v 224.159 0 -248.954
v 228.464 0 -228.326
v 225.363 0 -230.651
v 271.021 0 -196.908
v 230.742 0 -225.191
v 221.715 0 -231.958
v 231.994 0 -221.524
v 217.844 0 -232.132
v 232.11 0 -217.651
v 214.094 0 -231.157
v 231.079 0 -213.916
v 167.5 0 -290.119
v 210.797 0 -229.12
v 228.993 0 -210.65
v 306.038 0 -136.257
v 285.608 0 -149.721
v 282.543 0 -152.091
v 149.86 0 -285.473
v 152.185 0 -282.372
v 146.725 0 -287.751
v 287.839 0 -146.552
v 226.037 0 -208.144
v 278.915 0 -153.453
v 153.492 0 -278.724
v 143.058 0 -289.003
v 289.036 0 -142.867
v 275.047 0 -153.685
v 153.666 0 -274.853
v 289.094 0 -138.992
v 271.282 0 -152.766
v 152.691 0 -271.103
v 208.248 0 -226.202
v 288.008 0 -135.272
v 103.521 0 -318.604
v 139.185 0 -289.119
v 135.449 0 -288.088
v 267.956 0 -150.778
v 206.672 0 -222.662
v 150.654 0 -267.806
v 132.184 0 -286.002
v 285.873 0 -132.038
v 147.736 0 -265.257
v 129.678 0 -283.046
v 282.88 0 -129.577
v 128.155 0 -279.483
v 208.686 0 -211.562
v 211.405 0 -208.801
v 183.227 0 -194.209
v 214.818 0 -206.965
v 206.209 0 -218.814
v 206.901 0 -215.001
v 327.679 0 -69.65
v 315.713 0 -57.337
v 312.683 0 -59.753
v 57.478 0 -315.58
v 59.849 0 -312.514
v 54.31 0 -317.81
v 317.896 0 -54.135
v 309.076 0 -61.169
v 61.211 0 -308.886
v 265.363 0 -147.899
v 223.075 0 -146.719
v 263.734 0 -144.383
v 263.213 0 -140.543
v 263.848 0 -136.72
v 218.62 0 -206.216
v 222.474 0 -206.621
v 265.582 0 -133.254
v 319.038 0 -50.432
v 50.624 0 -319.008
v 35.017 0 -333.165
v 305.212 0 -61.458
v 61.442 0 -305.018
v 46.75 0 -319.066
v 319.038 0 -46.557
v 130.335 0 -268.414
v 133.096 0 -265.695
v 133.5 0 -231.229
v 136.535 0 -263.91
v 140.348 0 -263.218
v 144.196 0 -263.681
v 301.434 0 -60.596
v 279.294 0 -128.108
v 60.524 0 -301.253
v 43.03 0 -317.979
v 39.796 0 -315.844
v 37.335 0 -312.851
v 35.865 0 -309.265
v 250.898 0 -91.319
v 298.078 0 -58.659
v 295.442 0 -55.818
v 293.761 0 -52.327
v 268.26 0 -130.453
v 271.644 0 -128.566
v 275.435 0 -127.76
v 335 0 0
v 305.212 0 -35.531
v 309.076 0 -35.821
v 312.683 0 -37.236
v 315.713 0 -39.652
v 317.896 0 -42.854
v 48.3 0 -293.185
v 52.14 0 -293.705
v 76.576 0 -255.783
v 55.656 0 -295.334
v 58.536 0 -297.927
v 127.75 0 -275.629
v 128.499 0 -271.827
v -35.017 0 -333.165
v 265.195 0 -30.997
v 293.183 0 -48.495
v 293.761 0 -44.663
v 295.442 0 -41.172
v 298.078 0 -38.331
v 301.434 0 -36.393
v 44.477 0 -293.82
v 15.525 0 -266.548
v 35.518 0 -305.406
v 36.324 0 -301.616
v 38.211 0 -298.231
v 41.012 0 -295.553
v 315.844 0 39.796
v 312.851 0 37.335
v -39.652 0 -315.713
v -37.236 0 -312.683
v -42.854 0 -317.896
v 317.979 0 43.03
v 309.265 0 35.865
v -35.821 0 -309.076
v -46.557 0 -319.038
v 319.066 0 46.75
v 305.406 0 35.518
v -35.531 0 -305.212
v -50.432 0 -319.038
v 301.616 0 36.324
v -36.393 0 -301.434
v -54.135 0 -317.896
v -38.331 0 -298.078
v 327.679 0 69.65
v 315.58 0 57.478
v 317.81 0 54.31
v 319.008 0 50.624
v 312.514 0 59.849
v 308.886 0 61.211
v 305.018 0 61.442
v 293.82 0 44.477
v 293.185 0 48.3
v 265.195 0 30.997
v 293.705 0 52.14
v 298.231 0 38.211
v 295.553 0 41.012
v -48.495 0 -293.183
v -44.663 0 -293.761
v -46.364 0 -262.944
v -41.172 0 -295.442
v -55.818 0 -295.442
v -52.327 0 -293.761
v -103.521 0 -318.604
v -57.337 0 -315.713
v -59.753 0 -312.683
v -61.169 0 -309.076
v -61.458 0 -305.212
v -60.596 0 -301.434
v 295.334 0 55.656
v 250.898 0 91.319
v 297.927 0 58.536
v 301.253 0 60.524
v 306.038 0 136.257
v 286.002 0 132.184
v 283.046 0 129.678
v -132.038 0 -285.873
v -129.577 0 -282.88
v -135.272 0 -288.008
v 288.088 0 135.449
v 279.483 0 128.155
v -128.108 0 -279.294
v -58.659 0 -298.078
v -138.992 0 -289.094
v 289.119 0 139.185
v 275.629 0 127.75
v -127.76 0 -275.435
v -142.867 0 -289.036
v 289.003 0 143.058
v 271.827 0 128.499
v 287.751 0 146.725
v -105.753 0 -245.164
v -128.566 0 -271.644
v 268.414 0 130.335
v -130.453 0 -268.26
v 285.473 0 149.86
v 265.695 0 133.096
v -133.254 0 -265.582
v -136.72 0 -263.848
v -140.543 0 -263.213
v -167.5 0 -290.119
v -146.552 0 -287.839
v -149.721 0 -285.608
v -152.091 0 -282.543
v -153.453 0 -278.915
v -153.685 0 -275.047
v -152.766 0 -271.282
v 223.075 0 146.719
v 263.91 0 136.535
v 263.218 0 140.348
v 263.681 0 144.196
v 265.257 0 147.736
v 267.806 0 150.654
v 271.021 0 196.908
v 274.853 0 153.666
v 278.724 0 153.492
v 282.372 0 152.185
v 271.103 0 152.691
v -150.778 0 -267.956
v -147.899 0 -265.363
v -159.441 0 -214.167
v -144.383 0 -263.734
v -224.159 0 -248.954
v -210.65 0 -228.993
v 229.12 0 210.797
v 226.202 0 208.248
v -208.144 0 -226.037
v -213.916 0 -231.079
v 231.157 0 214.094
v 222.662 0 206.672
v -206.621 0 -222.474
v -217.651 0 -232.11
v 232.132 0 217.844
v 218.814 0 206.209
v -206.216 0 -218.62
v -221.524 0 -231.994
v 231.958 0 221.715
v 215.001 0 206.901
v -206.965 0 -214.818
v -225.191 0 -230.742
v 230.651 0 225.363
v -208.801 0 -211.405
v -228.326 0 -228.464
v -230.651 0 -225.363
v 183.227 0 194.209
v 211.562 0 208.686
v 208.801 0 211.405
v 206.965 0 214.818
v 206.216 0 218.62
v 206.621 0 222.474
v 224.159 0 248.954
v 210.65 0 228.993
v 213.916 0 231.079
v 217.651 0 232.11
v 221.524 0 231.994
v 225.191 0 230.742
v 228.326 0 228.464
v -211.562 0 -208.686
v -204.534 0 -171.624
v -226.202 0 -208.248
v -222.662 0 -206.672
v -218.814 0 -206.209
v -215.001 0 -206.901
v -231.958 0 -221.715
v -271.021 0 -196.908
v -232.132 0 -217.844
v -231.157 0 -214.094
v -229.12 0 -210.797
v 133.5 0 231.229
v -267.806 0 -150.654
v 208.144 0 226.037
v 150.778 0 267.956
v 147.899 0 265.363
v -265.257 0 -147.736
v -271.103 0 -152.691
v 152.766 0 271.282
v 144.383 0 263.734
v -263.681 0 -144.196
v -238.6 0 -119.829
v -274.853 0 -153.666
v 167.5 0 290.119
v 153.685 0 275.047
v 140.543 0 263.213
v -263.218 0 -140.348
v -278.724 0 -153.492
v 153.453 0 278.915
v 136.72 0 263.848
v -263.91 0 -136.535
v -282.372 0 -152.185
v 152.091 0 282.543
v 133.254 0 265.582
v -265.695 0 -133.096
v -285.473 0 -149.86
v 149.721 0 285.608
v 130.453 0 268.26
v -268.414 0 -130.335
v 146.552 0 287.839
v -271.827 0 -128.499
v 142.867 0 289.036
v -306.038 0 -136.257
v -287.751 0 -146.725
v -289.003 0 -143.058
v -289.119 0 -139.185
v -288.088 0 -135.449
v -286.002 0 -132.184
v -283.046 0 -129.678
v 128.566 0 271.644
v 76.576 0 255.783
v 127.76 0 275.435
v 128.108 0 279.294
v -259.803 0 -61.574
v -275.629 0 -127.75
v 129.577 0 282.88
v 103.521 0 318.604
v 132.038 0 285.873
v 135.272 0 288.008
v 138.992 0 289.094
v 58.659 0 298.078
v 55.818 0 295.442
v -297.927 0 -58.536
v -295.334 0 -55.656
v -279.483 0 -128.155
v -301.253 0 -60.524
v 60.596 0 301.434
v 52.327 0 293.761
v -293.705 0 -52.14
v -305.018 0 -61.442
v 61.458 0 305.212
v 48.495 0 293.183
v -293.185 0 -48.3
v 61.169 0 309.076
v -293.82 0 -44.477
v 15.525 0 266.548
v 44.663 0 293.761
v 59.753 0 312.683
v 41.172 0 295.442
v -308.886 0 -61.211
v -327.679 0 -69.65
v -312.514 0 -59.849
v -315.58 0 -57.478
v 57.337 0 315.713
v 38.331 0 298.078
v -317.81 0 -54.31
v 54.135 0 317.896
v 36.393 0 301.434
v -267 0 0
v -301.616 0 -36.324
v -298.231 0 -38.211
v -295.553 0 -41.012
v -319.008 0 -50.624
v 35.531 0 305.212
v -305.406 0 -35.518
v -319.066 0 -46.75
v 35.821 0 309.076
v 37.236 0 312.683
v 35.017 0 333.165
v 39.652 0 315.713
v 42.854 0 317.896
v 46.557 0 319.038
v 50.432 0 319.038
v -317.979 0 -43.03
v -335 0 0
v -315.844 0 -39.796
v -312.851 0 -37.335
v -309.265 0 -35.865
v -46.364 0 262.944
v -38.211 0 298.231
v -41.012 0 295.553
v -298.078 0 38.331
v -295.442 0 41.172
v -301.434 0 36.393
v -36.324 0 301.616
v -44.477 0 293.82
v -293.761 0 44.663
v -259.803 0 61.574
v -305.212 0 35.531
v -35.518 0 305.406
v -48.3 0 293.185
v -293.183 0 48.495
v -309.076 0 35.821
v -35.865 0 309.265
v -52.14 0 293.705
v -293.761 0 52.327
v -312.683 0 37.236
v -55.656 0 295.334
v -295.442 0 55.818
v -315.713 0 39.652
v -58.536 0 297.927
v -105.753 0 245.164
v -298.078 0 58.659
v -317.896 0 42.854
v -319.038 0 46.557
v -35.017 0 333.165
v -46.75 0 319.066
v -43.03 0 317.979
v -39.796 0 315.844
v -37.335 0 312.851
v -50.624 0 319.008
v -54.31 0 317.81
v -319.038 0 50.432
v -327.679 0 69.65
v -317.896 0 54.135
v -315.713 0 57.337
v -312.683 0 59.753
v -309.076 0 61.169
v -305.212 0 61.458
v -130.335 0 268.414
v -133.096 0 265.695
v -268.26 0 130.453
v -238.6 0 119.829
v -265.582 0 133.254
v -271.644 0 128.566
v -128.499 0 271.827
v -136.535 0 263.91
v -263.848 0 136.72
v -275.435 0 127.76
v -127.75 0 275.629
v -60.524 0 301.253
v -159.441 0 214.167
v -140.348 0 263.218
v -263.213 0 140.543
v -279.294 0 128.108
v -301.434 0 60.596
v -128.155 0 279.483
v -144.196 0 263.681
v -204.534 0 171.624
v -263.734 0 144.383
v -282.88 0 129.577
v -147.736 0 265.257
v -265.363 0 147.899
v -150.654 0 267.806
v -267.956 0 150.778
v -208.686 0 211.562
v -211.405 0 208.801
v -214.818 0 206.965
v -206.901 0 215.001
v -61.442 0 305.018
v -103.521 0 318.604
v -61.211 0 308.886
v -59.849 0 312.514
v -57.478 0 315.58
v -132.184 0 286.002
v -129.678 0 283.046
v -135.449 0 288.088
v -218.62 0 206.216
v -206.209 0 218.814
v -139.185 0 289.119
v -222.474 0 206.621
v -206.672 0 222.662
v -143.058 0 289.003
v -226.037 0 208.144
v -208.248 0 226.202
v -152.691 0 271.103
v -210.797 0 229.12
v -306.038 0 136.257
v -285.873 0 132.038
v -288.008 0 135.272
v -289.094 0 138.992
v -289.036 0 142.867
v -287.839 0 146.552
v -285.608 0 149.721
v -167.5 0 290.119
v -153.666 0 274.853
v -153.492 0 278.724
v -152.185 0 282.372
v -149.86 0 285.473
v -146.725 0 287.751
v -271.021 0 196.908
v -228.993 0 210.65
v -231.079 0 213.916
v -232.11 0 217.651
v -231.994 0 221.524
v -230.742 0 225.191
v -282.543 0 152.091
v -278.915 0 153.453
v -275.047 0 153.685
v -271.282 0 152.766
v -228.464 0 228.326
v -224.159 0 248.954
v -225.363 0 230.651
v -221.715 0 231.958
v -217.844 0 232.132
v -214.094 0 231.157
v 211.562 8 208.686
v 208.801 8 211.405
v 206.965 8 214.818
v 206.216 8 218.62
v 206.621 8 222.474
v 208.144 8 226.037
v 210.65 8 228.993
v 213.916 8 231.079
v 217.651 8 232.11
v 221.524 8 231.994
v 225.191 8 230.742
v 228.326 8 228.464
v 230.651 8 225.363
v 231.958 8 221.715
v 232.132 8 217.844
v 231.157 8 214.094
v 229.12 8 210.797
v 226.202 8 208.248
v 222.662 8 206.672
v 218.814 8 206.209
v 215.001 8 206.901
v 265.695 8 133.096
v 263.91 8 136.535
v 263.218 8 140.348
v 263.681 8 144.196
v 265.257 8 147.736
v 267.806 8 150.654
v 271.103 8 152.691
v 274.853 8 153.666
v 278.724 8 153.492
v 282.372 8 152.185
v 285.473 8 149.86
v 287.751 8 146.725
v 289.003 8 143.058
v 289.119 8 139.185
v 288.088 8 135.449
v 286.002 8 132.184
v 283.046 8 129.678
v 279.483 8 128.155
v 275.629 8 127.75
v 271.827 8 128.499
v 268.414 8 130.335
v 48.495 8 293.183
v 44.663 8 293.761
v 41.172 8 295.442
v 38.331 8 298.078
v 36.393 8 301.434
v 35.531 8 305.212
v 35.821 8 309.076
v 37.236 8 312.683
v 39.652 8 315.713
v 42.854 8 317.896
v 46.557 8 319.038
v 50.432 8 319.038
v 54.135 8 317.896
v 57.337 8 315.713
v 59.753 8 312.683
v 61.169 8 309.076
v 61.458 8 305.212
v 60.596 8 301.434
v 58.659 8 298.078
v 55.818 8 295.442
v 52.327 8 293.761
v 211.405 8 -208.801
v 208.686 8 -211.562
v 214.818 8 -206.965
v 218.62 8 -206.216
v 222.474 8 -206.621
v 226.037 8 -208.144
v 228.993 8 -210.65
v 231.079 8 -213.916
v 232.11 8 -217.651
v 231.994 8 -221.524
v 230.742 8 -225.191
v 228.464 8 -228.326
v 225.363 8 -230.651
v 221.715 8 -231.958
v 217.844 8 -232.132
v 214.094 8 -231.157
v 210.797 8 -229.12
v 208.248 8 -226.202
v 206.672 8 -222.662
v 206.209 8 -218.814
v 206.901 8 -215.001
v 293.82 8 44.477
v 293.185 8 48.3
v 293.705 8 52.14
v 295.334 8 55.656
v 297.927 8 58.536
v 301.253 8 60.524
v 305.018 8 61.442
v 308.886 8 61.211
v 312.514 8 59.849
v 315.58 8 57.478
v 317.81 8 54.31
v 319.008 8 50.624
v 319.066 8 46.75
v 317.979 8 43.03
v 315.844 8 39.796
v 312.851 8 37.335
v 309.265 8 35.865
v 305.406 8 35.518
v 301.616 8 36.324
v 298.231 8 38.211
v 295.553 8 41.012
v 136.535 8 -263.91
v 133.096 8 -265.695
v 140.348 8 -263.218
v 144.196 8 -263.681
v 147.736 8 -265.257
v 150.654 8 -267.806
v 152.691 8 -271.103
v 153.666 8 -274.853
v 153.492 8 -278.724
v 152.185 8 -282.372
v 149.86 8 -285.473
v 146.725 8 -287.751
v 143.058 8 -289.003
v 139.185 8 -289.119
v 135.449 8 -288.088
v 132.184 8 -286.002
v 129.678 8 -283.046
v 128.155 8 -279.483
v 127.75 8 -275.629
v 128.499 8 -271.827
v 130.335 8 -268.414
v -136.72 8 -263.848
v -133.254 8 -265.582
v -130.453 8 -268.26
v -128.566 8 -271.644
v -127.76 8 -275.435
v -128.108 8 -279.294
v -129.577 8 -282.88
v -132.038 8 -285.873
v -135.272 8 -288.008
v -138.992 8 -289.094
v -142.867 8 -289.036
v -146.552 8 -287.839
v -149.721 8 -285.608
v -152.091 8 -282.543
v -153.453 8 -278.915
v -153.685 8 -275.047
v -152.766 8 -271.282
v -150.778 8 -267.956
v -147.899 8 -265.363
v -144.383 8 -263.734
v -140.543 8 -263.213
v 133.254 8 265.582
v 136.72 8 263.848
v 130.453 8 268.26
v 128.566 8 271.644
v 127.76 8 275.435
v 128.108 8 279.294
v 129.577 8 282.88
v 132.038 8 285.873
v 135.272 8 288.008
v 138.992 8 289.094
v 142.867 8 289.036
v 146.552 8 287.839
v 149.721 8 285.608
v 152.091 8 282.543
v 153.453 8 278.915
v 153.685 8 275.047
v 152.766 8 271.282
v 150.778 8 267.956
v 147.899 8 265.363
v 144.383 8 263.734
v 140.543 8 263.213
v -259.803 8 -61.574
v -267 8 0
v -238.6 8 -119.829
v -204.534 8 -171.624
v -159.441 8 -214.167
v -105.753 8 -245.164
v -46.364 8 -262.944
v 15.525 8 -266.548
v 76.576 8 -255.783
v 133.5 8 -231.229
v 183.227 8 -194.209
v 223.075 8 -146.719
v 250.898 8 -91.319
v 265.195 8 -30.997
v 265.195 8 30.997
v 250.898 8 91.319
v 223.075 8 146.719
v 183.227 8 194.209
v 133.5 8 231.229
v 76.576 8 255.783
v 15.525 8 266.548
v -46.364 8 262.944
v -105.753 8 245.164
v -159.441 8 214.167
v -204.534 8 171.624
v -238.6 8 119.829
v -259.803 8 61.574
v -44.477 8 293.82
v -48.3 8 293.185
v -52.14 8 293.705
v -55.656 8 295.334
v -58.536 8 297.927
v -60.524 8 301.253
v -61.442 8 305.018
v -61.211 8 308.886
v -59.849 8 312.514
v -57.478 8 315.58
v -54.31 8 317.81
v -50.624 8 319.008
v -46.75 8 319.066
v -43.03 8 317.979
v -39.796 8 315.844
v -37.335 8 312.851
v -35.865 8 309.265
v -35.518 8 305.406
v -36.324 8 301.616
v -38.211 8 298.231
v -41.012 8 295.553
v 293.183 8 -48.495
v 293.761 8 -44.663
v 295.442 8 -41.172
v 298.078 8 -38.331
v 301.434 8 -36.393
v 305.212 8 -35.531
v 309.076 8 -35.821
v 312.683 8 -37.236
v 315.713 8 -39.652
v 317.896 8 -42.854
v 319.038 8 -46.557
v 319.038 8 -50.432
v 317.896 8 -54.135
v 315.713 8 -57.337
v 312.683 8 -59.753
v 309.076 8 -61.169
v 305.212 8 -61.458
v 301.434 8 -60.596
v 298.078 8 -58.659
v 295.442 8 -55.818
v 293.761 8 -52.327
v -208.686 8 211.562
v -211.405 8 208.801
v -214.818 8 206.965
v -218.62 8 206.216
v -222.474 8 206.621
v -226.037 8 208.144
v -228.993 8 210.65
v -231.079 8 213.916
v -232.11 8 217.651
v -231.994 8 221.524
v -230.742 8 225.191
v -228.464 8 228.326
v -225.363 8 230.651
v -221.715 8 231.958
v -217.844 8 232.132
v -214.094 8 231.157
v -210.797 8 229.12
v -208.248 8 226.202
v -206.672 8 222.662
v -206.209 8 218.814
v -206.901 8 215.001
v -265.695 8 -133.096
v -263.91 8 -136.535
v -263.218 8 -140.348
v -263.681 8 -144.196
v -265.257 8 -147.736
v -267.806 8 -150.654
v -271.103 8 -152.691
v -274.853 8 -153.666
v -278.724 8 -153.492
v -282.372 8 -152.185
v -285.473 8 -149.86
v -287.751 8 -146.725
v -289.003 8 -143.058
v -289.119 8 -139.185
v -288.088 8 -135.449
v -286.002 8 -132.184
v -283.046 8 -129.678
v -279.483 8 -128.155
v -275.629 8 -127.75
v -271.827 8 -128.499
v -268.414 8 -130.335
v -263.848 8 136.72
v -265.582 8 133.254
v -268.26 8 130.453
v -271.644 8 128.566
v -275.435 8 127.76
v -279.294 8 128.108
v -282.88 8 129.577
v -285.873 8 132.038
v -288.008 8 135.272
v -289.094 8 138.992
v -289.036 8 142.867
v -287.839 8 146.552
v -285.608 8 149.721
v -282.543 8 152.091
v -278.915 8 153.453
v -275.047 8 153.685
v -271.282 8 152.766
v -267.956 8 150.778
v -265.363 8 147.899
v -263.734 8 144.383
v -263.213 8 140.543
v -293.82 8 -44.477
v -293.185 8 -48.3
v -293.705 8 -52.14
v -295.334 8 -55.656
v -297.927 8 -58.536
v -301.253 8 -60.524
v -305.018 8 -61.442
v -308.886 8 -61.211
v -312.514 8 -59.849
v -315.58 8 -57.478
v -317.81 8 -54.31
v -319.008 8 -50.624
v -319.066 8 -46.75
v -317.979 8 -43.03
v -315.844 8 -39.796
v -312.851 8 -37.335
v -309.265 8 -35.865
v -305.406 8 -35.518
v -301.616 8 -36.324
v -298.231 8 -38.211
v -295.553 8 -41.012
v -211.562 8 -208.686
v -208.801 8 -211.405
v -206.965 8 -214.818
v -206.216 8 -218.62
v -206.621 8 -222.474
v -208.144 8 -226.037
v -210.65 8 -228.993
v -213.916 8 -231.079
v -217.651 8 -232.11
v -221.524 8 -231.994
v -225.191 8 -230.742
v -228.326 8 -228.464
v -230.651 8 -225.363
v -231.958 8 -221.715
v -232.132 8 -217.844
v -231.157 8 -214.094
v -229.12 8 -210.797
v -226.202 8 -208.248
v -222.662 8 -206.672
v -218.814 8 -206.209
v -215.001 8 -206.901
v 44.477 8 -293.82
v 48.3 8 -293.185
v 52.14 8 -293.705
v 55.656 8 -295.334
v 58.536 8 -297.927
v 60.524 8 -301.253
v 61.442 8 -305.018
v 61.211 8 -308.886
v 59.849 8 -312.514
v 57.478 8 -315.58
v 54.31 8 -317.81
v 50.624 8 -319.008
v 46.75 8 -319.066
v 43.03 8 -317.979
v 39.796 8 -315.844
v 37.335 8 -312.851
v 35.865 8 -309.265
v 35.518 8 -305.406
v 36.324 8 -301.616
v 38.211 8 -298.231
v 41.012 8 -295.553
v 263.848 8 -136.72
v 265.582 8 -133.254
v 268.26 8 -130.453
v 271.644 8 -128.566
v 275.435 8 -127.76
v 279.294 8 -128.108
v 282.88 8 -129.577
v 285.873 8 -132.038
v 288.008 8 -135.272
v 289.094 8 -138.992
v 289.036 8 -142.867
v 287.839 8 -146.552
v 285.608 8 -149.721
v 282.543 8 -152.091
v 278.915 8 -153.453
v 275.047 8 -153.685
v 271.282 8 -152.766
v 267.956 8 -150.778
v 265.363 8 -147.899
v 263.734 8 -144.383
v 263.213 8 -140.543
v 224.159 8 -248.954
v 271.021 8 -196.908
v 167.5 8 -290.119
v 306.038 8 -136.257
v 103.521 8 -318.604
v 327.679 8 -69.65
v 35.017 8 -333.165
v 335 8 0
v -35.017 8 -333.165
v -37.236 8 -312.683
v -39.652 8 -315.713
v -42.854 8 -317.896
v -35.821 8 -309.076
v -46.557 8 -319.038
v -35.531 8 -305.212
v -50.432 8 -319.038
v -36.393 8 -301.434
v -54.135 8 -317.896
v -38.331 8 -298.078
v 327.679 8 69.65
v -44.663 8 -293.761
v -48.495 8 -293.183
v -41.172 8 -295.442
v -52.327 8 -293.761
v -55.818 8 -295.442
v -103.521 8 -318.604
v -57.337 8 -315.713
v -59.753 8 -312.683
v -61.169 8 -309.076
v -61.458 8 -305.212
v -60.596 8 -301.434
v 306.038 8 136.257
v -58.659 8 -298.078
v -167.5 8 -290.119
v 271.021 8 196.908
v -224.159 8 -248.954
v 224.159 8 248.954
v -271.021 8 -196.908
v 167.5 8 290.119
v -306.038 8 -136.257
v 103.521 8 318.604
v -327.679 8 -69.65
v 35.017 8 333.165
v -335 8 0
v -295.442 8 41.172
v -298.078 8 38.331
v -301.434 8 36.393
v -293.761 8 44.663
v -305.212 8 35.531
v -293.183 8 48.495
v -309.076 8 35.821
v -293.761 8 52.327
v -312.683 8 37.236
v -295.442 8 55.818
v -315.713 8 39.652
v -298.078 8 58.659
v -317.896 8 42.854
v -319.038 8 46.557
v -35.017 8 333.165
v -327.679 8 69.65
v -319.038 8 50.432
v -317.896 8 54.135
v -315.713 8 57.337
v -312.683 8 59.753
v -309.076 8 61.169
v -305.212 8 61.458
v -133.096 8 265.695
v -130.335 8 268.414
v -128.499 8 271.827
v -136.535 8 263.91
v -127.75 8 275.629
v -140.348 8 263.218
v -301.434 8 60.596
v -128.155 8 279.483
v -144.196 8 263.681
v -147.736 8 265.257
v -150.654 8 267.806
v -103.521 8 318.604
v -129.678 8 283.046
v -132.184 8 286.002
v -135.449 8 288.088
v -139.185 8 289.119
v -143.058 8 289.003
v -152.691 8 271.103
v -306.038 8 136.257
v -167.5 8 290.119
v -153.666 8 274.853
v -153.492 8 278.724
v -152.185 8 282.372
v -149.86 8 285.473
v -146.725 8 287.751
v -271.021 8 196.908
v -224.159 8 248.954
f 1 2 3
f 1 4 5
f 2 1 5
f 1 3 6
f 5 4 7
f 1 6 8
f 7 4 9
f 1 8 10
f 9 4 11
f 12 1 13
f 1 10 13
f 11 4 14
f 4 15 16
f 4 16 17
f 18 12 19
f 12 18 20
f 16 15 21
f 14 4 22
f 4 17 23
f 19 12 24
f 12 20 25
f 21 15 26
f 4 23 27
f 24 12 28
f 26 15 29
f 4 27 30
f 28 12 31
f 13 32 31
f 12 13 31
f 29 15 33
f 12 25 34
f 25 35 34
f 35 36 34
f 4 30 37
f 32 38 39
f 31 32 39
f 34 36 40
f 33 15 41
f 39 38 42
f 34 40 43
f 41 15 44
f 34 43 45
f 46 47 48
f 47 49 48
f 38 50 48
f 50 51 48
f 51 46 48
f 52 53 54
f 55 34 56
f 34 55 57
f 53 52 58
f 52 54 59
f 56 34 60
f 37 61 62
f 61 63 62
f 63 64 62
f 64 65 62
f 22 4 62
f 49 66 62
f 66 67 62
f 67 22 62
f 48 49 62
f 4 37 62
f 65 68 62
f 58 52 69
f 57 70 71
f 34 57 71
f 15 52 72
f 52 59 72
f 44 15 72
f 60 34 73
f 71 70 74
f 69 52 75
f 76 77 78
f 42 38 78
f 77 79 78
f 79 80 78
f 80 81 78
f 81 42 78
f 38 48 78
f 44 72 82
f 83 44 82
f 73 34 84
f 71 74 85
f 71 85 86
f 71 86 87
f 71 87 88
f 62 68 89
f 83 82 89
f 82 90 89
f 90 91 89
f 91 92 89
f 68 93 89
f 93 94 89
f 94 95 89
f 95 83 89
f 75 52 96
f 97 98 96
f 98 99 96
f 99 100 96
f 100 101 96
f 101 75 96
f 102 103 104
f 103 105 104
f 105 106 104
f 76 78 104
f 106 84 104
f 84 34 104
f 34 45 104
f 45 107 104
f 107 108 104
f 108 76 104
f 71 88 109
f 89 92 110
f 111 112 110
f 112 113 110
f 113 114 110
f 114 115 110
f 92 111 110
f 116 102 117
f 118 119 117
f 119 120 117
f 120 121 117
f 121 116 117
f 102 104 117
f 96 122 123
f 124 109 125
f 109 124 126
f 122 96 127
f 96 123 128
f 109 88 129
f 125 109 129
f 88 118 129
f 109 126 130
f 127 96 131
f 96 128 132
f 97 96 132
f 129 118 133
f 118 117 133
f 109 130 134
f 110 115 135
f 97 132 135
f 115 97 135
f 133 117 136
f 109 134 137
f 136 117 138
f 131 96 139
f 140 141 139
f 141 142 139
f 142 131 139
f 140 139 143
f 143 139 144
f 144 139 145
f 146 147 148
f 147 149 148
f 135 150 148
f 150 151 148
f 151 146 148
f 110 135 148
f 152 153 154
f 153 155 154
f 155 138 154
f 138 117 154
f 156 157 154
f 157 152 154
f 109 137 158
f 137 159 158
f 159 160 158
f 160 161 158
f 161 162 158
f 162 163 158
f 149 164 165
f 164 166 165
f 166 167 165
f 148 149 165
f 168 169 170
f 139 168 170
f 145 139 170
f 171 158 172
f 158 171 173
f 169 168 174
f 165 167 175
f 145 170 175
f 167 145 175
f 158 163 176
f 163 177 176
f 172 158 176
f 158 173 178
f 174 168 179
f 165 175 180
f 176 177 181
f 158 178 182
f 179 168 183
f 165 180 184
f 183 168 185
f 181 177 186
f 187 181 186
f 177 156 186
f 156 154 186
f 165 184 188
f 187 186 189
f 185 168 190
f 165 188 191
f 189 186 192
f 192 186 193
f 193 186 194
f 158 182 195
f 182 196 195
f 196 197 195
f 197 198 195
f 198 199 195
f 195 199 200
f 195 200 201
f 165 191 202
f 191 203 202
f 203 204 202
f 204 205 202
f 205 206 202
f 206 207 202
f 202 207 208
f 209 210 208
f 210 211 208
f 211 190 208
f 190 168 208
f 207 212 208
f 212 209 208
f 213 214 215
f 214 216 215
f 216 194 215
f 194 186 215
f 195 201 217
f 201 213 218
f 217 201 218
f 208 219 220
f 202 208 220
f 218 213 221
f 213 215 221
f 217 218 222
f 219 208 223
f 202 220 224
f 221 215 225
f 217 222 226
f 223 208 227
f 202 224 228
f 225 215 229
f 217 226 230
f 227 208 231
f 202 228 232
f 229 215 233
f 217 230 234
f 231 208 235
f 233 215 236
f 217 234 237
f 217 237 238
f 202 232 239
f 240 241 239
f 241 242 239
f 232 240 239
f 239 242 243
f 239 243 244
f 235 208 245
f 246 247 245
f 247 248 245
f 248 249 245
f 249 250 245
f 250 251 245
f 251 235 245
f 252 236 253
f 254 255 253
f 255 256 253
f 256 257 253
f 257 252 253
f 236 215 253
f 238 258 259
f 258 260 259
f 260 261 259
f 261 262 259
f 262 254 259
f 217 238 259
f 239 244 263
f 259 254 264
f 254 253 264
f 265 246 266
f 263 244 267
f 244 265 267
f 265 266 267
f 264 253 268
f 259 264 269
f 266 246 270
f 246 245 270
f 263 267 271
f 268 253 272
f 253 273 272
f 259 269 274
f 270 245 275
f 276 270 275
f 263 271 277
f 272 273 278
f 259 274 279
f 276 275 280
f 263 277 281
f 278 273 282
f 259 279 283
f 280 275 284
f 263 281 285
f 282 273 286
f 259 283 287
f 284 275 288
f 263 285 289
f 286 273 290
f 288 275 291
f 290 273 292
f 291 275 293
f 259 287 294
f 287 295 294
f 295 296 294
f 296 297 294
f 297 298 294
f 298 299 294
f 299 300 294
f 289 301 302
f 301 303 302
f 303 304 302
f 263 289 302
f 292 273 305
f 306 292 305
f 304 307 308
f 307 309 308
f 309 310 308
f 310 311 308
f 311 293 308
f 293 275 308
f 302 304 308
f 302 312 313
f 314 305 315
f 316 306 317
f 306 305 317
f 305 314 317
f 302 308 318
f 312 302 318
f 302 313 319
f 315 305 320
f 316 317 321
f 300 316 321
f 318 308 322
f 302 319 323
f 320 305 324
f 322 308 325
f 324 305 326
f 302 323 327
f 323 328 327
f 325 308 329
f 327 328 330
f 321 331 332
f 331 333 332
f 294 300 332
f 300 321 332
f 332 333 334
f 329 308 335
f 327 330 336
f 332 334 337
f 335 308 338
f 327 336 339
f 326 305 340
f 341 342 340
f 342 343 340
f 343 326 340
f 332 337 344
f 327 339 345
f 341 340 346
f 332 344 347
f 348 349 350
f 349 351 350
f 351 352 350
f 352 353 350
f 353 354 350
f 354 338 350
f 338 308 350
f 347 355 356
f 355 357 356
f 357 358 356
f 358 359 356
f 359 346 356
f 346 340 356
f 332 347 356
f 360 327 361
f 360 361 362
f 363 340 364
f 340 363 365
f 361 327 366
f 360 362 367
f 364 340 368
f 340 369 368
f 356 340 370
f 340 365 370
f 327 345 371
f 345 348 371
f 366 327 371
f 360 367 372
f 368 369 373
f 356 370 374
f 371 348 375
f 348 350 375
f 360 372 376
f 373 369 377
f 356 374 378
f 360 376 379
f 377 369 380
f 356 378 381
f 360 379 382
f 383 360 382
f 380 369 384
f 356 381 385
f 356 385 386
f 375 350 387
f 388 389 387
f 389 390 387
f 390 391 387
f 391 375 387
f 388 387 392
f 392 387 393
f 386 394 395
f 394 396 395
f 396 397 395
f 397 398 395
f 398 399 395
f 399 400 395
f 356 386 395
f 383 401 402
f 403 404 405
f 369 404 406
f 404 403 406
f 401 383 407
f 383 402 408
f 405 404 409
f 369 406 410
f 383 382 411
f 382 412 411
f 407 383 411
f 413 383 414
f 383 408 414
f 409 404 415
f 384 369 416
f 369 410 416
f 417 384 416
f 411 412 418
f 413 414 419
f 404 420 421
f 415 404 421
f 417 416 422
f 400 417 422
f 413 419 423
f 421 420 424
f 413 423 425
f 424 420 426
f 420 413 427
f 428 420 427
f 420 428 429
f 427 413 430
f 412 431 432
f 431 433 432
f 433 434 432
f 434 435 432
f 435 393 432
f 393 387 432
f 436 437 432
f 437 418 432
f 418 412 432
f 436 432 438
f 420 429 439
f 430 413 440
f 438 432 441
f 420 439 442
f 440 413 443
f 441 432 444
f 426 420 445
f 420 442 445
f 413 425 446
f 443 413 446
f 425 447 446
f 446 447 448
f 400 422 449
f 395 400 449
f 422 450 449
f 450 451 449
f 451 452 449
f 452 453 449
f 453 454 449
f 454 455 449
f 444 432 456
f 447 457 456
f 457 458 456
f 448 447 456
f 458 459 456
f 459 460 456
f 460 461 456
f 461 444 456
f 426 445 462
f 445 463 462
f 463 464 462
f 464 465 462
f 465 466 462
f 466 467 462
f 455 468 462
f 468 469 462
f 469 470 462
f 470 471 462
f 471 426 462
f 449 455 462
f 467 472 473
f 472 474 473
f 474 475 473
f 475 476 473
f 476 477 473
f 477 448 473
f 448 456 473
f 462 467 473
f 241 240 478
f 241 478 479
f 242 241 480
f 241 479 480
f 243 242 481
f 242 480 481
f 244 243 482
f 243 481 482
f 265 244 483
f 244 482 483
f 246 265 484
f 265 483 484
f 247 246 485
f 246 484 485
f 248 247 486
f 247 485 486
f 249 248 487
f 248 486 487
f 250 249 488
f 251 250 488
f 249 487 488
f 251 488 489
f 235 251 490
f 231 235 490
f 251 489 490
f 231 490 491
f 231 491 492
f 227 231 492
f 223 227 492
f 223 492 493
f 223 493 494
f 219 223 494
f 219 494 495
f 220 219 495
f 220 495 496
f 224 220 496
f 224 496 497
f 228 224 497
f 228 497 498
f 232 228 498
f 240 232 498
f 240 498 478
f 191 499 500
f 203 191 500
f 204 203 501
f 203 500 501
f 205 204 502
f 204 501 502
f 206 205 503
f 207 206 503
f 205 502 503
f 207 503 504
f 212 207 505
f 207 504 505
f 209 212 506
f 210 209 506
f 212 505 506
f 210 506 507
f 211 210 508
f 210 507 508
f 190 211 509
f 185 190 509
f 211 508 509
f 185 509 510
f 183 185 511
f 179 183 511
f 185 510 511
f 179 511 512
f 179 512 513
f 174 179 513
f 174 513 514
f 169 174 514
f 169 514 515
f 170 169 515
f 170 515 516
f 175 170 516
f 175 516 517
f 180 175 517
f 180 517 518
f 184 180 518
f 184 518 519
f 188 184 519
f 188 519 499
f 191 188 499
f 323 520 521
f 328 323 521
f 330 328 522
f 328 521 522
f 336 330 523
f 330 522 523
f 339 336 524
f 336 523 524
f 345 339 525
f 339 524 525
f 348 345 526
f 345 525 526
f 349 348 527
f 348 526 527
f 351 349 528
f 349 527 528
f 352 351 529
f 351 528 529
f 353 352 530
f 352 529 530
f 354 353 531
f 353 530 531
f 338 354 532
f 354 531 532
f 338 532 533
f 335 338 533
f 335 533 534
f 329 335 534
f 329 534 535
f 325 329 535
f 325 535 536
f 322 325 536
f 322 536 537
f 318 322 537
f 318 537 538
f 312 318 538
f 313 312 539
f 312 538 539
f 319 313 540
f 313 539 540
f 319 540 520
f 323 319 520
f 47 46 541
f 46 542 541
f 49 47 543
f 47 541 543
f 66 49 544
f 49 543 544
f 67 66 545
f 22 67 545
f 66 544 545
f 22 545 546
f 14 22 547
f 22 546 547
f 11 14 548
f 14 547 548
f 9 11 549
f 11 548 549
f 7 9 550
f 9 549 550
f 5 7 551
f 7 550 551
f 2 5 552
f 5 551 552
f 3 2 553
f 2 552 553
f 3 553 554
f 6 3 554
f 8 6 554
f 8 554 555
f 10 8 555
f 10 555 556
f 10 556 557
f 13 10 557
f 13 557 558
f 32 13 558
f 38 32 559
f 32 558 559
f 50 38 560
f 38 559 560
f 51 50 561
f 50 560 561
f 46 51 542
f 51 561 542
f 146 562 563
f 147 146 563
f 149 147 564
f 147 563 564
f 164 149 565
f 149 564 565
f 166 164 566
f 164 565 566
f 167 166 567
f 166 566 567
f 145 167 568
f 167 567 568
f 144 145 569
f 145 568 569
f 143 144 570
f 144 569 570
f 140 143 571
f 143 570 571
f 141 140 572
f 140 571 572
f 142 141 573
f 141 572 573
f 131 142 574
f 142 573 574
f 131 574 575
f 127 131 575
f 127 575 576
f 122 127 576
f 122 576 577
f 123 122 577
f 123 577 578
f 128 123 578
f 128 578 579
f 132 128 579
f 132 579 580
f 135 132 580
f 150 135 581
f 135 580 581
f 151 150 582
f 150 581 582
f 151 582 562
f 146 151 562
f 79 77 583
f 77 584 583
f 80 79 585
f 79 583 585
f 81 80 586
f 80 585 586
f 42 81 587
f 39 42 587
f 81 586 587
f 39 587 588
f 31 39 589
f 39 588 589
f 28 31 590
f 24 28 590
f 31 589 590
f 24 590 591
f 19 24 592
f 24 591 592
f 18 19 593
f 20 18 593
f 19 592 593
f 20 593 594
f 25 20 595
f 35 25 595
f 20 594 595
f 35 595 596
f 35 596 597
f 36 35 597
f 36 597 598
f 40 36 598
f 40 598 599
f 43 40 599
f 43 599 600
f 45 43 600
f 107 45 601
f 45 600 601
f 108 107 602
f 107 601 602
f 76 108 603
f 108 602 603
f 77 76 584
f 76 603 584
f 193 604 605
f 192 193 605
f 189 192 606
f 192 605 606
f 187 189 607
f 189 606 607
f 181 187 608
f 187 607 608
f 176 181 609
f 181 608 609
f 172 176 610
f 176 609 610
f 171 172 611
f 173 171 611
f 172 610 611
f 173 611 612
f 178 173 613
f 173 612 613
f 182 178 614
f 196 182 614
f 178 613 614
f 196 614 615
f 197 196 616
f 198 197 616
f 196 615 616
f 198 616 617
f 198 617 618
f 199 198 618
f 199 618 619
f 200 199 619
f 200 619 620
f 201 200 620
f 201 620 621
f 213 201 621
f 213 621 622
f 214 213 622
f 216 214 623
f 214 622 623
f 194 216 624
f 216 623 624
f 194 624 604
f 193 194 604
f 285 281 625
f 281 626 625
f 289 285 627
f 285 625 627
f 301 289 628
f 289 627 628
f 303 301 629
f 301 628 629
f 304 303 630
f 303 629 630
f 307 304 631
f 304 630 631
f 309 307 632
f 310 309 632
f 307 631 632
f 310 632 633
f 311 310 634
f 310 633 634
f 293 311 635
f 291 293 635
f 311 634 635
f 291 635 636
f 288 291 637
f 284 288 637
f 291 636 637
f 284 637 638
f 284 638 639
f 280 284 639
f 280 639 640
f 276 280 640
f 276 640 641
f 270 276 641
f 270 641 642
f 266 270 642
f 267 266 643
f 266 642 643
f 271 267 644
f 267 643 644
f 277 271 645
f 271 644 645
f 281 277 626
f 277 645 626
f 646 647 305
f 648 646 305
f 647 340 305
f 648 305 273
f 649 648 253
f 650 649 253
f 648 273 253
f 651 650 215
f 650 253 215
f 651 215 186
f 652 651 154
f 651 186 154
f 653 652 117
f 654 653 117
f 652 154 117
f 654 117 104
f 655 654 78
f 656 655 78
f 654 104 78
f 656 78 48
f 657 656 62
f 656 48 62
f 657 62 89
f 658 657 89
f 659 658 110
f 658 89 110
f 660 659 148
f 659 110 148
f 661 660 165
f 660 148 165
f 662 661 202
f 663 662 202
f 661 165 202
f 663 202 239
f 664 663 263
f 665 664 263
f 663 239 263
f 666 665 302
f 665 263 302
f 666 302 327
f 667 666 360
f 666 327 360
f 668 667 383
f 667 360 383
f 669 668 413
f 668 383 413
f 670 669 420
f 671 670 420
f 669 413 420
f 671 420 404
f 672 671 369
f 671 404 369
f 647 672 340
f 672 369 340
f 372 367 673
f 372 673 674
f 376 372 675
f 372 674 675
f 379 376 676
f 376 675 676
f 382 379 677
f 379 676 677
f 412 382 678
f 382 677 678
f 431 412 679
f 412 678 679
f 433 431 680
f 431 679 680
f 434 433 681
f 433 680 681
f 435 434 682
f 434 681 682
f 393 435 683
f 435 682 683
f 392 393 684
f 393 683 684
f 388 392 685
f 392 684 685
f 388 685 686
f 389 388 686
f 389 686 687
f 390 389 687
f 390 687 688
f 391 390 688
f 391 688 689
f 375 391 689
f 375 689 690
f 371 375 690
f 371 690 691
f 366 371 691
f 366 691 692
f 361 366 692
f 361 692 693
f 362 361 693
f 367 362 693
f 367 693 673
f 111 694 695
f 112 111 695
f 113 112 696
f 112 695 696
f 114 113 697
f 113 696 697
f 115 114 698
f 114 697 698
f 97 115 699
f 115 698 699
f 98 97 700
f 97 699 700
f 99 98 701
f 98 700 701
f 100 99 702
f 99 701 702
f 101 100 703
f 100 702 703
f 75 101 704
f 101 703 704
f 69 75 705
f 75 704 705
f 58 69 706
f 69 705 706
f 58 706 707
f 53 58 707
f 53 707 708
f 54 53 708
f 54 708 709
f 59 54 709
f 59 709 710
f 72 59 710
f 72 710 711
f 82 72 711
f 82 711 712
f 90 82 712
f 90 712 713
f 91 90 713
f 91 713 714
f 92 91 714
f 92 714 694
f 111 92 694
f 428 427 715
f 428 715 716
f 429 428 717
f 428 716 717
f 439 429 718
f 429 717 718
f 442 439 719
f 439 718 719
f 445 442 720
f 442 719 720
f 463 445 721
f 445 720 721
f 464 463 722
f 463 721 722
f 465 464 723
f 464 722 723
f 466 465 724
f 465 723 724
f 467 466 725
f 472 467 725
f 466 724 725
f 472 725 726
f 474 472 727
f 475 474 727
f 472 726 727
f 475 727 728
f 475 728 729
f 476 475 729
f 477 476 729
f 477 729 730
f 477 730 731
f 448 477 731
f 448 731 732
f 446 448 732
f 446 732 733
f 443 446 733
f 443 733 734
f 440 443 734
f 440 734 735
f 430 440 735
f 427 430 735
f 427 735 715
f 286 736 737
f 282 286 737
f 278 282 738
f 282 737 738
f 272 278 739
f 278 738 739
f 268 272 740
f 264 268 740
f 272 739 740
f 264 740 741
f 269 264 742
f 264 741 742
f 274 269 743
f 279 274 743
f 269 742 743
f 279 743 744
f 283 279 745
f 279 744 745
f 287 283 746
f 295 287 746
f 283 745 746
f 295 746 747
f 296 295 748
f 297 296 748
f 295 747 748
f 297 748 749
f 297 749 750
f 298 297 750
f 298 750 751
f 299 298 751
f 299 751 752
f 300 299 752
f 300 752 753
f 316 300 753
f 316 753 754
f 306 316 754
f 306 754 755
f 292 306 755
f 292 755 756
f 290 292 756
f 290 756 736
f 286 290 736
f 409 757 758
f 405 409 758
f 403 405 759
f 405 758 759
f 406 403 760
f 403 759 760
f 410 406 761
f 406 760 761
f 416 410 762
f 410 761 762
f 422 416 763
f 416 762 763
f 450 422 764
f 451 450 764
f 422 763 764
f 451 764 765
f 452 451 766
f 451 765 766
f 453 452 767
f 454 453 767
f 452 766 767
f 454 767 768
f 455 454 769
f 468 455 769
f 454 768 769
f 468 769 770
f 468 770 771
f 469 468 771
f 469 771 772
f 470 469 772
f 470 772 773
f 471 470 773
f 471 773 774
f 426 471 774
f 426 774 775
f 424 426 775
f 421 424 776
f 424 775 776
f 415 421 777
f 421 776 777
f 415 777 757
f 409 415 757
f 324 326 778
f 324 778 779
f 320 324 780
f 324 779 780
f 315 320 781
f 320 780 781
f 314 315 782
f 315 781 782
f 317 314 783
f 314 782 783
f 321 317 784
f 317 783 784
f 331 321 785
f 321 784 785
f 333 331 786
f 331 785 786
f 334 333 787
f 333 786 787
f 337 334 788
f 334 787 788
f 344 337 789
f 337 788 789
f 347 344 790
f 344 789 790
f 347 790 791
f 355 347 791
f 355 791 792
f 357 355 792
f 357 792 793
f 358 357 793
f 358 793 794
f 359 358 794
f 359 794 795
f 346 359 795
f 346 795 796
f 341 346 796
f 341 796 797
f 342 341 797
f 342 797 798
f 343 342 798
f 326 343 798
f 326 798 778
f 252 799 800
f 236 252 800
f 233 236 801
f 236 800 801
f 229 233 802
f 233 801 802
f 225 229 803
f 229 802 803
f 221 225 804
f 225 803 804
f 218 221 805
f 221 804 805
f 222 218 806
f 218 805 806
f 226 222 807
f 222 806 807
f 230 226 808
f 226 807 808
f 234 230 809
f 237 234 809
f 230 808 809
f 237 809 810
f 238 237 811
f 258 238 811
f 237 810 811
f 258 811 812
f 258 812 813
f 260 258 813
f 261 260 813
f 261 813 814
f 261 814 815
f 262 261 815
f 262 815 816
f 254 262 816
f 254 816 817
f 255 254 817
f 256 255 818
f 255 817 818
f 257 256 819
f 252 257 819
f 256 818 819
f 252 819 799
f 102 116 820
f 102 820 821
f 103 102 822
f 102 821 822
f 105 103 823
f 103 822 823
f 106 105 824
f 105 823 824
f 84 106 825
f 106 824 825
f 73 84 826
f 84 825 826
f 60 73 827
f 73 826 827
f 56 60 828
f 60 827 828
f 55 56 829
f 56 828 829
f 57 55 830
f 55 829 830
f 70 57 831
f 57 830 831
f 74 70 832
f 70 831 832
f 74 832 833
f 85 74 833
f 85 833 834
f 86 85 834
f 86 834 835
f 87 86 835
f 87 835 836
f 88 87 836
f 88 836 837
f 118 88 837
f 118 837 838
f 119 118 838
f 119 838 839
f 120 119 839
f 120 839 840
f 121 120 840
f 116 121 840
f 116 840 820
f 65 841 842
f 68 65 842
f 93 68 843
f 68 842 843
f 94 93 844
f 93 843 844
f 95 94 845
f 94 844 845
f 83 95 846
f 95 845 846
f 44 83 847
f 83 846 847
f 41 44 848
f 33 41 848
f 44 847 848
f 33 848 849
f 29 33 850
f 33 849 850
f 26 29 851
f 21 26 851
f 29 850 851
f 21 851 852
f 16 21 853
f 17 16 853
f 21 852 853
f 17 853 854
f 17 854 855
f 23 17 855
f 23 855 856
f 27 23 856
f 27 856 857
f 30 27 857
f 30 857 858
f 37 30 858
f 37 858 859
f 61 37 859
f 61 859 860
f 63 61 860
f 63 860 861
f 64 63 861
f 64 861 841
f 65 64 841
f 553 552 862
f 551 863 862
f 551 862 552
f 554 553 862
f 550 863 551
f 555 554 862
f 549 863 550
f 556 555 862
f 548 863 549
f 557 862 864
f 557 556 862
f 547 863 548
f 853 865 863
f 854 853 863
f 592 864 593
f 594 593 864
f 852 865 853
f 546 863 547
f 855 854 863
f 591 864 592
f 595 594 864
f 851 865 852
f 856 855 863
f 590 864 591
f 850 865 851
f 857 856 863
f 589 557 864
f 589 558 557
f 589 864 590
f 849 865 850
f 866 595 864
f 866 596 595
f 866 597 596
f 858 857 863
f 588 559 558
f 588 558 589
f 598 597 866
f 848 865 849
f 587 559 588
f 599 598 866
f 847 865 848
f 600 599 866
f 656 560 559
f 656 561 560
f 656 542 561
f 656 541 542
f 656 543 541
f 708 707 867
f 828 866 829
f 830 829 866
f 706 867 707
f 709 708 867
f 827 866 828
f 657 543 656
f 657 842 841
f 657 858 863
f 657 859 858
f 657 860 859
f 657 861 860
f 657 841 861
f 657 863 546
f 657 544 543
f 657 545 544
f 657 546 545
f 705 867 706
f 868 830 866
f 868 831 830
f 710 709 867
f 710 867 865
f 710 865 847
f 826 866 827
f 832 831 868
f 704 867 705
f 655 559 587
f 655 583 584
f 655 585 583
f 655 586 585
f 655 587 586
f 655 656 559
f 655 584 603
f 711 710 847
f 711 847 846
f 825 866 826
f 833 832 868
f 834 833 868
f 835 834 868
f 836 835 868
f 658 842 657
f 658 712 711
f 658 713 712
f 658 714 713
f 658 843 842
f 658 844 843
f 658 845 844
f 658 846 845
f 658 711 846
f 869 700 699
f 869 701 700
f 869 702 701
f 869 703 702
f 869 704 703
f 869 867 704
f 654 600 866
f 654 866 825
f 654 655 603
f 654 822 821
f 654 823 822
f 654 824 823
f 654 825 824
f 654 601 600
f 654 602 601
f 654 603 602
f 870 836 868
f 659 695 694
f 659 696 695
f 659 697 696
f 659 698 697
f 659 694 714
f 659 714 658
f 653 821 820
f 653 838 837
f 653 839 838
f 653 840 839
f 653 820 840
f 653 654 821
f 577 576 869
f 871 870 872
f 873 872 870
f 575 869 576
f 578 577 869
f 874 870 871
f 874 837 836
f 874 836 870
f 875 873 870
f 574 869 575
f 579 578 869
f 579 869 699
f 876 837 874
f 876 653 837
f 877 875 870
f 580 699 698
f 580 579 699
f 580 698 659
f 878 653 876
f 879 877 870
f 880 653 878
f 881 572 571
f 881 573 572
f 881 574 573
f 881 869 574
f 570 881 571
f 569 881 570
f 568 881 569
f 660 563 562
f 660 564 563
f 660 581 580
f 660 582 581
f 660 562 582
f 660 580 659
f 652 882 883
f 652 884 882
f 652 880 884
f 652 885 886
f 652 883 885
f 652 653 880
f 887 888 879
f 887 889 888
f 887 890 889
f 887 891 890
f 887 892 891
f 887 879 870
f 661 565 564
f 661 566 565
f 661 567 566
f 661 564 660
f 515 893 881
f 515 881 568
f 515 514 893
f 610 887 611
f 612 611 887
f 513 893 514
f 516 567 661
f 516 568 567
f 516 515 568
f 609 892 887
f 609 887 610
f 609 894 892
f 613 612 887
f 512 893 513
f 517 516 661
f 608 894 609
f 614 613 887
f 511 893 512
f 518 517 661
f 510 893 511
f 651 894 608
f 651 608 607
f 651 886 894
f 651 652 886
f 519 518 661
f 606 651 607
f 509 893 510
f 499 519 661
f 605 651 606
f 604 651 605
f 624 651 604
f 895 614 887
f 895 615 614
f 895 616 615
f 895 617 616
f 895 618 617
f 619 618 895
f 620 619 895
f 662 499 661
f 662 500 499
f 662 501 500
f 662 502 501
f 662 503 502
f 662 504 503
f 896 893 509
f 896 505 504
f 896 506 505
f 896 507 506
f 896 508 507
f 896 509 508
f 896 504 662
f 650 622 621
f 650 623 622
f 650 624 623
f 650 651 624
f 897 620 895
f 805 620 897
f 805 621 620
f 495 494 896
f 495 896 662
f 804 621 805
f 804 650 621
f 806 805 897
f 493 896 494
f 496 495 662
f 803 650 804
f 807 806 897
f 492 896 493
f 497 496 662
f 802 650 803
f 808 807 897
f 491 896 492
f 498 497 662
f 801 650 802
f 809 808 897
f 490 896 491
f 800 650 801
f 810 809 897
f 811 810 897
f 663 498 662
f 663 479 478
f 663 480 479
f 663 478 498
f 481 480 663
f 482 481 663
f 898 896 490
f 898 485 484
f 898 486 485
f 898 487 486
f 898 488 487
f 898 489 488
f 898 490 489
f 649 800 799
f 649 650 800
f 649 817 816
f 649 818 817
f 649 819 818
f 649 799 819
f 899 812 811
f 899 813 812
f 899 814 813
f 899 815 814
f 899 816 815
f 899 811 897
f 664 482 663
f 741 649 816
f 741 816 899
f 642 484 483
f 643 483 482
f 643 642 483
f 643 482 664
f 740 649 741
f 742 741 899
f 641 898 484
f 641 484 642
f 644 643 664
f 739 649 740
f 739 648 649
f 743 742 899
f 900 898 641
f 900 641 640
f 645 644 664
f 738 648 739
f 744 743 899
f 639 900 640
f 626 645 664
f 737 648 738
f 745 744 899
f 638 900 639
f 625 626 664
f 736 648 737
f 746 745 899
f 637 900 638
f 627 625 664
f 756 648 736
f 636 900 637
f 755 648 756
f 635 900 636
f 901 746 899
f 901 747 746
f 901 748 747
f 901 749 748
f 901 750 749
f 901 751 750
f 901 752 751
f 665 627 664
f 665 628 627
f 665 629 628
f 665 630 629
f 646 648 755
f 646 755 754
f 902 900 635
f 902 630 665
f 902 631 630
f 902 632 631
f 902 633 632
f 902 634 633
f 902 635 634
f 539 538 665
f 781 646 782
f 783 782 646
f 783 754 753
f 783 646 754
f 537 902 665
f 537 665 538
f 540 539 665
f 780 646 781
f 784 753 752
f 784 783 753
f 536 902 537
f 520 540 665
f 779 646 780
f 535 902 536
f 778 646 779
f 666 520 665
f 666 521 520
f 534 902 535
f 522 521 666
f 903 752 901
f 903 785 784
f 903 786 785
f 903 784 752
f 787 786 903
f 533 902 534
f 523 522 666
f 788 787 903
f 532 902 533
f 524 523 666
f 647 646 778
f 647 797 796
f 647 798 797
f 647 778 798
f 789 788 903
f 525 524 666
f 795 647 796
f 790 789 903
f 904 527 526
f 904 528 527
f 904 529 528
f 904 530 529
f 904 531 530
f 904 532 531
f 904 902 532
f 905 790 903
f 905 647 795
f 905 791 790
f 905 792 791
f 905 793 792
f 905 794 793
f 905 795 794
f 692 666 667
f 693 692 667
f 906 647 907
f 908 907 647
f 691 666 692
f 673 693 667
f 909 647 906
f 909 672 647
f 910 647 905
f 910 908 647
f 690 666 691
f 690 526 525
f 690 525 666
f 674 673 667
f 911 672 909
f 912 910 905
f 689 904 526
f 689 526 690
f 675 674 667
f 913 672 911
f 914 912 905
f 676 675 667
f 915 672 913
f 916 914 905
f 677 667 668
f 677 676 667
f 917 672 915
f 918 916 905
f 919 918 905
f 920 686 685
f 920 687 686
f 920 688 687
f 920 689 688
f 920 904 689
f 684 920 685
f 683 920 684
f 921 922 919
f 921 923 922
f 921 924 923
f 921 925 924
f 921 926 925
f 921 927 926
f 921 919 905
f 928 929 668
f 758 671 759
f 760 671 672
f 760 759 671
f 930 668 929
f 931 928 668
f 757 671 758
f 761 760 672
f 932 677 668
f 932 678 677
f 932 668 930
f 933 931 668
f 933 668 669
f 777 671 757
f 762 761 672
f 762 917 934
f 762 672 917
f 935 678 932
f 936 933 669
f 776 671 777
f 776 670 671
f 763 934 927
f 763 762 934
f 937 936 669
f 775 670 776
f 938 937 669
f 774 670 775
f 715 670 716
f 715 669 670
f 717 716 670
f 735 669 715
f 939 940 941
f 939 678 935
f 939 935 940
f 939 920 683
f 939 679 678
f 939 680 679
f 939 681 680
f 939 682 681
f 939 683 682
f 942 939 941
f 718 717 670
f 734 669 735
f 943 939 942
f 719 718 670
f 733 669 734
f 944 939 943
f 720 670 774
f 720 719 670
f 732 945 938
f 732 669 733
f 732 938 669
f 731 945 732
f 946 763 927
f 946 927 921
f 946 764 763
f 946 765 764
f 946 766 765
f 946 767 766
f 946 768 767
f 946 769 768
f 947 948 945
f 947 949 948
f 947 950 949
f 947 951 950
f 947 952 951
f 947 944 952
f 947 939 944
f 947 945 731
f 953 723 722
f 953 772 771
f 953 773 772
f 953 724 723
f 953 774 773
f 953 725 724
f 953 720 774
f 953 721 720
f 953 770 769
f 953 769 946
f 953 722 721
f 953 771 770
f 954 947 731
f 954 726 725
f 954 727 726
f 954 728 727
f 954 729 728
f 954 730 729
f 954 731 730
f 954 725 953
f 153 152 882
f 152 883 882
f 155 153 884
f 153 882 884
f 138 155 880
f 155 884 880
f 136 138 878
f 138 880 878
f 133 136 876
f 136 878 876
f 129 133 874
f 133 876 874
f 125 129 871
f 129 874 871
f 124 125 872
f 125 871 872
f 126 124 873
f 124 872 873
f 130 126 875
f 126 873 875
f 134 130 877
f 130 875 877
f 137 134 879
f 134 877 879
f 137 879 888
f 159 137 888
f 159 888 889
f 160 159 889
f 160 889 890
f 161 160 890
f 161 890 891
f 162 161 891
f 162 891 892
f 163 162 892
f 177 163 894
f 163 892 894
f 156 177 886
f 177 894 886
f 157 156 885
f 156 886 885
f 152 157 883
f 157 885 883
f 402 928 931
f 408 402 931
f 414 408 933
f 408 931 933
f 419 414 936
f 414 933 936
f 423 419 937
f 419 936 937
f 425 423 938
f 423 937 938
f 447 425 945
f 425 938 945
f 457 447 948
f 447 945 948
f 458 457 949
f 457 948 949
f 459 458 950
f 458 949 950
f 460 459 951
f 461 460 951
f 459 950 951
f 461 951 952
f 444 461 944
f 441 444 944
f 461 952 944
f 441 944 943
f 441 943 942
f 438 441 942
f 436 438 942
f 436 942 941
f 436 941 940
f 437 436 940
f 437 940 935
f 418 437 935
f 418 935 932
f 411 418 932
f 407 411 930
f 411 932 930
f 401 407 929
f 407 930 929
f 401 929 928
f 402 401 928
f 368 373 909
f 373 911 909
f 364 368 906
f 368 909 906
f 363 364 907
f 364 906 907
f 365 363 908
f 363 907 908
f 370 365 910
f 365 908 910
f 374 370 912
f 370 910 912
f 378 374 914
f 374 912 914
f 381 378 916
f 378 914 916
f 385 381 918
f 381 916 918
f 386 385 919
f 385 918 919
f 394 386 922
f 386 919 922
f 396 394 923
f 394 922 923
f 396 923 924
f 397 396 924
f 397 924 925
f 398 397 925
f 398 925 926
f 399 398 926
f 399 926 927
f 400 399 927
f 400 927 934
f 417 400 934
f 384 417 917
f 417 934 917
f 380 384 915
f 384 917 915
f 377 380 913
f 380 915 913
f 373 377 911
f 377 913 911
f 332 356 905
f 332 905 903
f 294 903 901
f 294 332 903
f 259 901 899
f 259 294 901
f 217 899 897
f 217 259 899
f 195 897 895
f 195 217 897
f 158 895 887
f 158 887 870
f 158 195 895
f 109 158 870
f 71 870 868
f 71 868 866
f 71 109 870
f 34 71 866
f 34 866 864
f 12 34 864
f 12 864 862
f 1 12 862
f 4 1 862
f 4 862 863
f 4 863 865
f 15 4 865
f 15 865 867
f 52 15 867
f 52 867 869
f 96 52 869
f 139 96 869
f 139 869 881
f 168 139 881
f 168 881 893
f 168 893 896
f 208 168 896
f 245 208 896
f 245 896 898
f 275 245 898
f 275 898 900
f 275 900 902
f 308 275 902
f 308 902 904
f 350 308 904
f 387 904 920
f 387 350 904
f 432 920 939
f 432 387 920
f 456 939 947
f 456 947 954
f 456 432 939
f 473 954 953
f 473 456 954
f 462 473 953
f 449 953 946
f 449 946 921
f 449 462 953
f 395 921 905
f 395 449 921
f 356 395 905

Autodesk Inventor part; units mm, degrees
ref_plane "YZ Plane" through (0, 0, 0) normal (1, 0, 0) x (0, 1, 0)
ref_plane "XZ Plane" through (0, 0, 0) normal (0, 1, 0) x (-1, 0, 0)
ref_plane "XY Plane" through (0, 0, 0) normal (0, 0, 1) x (1, 0, 0)
sketch "Sketch1" plane through (0, 0, 0) normal (0, 1, 0) x (-1, 0, 0)
  circle A0 centre (0, 0) radius 267
  circle A1 centre (0, 0) radius 335
  line L0 (335, 0) -> (267, 0)
  line L1 (-267, 0) -> (-335, 0)
  line L2 (0, 267) -> (0, 335)
  point P0 (301, 0)
  point P1 (-301, 0)
  point P2 (0, 301)
  dimension "d1" = 670
  dimension "d4" = 534
extrude "Extrusion1" add sketch "Sketch1" along normal blind 8 contours L0 A1 L1 A0 | A0 L2 A1 L0 | A0 L1 A1 L2
sketch "Sketch2" plane through (0, 0, 0) normal (0, -1, 0) x (1, 0, 0)
  line L0 (0, 0) -> (0, 310) construction
  line L1 (0, 0) -> (48.4947, 306.1834) construction
  circle A0 centre (0, 0) radius 310 construction
  dimension "d14" = 620
  dimension "d15" = 9
hole "Hole1" at (48.4947, 0, 306.1834) direction (0, 1, 0) diameter 26 end through all
pattern_circular "Circular Pattern2" count 20 over 360 about axis through (0, -10, 0) along (0, 1, 0) of "Hole1"
equation "\"d2\" = Thickness"
equation "\"d21\" = Thickness"
equation "\"BendRadius\" = Thickness"
equation "\"BendReliefWidth\" = Thickness"
equation "\"BendReliefDepth\" = 0.5 * Thickness"
equation "\"CornerReliefSize\" = 4 * Thickness"
equation "\"MinimumRemnant\" = 2 * Thickness"
equation "\"TransitionRadius\" = BendRadius"
equation "\"JacobiRadiusSize\" = BendRadius"
equation "\"GapSize\" = Thickness"
equation "\"d8\" = Thickness"
equation "\"Thickness\" = 8"
properties part number "!!PRS 9512 accses hatch flangeipt_D1200"
